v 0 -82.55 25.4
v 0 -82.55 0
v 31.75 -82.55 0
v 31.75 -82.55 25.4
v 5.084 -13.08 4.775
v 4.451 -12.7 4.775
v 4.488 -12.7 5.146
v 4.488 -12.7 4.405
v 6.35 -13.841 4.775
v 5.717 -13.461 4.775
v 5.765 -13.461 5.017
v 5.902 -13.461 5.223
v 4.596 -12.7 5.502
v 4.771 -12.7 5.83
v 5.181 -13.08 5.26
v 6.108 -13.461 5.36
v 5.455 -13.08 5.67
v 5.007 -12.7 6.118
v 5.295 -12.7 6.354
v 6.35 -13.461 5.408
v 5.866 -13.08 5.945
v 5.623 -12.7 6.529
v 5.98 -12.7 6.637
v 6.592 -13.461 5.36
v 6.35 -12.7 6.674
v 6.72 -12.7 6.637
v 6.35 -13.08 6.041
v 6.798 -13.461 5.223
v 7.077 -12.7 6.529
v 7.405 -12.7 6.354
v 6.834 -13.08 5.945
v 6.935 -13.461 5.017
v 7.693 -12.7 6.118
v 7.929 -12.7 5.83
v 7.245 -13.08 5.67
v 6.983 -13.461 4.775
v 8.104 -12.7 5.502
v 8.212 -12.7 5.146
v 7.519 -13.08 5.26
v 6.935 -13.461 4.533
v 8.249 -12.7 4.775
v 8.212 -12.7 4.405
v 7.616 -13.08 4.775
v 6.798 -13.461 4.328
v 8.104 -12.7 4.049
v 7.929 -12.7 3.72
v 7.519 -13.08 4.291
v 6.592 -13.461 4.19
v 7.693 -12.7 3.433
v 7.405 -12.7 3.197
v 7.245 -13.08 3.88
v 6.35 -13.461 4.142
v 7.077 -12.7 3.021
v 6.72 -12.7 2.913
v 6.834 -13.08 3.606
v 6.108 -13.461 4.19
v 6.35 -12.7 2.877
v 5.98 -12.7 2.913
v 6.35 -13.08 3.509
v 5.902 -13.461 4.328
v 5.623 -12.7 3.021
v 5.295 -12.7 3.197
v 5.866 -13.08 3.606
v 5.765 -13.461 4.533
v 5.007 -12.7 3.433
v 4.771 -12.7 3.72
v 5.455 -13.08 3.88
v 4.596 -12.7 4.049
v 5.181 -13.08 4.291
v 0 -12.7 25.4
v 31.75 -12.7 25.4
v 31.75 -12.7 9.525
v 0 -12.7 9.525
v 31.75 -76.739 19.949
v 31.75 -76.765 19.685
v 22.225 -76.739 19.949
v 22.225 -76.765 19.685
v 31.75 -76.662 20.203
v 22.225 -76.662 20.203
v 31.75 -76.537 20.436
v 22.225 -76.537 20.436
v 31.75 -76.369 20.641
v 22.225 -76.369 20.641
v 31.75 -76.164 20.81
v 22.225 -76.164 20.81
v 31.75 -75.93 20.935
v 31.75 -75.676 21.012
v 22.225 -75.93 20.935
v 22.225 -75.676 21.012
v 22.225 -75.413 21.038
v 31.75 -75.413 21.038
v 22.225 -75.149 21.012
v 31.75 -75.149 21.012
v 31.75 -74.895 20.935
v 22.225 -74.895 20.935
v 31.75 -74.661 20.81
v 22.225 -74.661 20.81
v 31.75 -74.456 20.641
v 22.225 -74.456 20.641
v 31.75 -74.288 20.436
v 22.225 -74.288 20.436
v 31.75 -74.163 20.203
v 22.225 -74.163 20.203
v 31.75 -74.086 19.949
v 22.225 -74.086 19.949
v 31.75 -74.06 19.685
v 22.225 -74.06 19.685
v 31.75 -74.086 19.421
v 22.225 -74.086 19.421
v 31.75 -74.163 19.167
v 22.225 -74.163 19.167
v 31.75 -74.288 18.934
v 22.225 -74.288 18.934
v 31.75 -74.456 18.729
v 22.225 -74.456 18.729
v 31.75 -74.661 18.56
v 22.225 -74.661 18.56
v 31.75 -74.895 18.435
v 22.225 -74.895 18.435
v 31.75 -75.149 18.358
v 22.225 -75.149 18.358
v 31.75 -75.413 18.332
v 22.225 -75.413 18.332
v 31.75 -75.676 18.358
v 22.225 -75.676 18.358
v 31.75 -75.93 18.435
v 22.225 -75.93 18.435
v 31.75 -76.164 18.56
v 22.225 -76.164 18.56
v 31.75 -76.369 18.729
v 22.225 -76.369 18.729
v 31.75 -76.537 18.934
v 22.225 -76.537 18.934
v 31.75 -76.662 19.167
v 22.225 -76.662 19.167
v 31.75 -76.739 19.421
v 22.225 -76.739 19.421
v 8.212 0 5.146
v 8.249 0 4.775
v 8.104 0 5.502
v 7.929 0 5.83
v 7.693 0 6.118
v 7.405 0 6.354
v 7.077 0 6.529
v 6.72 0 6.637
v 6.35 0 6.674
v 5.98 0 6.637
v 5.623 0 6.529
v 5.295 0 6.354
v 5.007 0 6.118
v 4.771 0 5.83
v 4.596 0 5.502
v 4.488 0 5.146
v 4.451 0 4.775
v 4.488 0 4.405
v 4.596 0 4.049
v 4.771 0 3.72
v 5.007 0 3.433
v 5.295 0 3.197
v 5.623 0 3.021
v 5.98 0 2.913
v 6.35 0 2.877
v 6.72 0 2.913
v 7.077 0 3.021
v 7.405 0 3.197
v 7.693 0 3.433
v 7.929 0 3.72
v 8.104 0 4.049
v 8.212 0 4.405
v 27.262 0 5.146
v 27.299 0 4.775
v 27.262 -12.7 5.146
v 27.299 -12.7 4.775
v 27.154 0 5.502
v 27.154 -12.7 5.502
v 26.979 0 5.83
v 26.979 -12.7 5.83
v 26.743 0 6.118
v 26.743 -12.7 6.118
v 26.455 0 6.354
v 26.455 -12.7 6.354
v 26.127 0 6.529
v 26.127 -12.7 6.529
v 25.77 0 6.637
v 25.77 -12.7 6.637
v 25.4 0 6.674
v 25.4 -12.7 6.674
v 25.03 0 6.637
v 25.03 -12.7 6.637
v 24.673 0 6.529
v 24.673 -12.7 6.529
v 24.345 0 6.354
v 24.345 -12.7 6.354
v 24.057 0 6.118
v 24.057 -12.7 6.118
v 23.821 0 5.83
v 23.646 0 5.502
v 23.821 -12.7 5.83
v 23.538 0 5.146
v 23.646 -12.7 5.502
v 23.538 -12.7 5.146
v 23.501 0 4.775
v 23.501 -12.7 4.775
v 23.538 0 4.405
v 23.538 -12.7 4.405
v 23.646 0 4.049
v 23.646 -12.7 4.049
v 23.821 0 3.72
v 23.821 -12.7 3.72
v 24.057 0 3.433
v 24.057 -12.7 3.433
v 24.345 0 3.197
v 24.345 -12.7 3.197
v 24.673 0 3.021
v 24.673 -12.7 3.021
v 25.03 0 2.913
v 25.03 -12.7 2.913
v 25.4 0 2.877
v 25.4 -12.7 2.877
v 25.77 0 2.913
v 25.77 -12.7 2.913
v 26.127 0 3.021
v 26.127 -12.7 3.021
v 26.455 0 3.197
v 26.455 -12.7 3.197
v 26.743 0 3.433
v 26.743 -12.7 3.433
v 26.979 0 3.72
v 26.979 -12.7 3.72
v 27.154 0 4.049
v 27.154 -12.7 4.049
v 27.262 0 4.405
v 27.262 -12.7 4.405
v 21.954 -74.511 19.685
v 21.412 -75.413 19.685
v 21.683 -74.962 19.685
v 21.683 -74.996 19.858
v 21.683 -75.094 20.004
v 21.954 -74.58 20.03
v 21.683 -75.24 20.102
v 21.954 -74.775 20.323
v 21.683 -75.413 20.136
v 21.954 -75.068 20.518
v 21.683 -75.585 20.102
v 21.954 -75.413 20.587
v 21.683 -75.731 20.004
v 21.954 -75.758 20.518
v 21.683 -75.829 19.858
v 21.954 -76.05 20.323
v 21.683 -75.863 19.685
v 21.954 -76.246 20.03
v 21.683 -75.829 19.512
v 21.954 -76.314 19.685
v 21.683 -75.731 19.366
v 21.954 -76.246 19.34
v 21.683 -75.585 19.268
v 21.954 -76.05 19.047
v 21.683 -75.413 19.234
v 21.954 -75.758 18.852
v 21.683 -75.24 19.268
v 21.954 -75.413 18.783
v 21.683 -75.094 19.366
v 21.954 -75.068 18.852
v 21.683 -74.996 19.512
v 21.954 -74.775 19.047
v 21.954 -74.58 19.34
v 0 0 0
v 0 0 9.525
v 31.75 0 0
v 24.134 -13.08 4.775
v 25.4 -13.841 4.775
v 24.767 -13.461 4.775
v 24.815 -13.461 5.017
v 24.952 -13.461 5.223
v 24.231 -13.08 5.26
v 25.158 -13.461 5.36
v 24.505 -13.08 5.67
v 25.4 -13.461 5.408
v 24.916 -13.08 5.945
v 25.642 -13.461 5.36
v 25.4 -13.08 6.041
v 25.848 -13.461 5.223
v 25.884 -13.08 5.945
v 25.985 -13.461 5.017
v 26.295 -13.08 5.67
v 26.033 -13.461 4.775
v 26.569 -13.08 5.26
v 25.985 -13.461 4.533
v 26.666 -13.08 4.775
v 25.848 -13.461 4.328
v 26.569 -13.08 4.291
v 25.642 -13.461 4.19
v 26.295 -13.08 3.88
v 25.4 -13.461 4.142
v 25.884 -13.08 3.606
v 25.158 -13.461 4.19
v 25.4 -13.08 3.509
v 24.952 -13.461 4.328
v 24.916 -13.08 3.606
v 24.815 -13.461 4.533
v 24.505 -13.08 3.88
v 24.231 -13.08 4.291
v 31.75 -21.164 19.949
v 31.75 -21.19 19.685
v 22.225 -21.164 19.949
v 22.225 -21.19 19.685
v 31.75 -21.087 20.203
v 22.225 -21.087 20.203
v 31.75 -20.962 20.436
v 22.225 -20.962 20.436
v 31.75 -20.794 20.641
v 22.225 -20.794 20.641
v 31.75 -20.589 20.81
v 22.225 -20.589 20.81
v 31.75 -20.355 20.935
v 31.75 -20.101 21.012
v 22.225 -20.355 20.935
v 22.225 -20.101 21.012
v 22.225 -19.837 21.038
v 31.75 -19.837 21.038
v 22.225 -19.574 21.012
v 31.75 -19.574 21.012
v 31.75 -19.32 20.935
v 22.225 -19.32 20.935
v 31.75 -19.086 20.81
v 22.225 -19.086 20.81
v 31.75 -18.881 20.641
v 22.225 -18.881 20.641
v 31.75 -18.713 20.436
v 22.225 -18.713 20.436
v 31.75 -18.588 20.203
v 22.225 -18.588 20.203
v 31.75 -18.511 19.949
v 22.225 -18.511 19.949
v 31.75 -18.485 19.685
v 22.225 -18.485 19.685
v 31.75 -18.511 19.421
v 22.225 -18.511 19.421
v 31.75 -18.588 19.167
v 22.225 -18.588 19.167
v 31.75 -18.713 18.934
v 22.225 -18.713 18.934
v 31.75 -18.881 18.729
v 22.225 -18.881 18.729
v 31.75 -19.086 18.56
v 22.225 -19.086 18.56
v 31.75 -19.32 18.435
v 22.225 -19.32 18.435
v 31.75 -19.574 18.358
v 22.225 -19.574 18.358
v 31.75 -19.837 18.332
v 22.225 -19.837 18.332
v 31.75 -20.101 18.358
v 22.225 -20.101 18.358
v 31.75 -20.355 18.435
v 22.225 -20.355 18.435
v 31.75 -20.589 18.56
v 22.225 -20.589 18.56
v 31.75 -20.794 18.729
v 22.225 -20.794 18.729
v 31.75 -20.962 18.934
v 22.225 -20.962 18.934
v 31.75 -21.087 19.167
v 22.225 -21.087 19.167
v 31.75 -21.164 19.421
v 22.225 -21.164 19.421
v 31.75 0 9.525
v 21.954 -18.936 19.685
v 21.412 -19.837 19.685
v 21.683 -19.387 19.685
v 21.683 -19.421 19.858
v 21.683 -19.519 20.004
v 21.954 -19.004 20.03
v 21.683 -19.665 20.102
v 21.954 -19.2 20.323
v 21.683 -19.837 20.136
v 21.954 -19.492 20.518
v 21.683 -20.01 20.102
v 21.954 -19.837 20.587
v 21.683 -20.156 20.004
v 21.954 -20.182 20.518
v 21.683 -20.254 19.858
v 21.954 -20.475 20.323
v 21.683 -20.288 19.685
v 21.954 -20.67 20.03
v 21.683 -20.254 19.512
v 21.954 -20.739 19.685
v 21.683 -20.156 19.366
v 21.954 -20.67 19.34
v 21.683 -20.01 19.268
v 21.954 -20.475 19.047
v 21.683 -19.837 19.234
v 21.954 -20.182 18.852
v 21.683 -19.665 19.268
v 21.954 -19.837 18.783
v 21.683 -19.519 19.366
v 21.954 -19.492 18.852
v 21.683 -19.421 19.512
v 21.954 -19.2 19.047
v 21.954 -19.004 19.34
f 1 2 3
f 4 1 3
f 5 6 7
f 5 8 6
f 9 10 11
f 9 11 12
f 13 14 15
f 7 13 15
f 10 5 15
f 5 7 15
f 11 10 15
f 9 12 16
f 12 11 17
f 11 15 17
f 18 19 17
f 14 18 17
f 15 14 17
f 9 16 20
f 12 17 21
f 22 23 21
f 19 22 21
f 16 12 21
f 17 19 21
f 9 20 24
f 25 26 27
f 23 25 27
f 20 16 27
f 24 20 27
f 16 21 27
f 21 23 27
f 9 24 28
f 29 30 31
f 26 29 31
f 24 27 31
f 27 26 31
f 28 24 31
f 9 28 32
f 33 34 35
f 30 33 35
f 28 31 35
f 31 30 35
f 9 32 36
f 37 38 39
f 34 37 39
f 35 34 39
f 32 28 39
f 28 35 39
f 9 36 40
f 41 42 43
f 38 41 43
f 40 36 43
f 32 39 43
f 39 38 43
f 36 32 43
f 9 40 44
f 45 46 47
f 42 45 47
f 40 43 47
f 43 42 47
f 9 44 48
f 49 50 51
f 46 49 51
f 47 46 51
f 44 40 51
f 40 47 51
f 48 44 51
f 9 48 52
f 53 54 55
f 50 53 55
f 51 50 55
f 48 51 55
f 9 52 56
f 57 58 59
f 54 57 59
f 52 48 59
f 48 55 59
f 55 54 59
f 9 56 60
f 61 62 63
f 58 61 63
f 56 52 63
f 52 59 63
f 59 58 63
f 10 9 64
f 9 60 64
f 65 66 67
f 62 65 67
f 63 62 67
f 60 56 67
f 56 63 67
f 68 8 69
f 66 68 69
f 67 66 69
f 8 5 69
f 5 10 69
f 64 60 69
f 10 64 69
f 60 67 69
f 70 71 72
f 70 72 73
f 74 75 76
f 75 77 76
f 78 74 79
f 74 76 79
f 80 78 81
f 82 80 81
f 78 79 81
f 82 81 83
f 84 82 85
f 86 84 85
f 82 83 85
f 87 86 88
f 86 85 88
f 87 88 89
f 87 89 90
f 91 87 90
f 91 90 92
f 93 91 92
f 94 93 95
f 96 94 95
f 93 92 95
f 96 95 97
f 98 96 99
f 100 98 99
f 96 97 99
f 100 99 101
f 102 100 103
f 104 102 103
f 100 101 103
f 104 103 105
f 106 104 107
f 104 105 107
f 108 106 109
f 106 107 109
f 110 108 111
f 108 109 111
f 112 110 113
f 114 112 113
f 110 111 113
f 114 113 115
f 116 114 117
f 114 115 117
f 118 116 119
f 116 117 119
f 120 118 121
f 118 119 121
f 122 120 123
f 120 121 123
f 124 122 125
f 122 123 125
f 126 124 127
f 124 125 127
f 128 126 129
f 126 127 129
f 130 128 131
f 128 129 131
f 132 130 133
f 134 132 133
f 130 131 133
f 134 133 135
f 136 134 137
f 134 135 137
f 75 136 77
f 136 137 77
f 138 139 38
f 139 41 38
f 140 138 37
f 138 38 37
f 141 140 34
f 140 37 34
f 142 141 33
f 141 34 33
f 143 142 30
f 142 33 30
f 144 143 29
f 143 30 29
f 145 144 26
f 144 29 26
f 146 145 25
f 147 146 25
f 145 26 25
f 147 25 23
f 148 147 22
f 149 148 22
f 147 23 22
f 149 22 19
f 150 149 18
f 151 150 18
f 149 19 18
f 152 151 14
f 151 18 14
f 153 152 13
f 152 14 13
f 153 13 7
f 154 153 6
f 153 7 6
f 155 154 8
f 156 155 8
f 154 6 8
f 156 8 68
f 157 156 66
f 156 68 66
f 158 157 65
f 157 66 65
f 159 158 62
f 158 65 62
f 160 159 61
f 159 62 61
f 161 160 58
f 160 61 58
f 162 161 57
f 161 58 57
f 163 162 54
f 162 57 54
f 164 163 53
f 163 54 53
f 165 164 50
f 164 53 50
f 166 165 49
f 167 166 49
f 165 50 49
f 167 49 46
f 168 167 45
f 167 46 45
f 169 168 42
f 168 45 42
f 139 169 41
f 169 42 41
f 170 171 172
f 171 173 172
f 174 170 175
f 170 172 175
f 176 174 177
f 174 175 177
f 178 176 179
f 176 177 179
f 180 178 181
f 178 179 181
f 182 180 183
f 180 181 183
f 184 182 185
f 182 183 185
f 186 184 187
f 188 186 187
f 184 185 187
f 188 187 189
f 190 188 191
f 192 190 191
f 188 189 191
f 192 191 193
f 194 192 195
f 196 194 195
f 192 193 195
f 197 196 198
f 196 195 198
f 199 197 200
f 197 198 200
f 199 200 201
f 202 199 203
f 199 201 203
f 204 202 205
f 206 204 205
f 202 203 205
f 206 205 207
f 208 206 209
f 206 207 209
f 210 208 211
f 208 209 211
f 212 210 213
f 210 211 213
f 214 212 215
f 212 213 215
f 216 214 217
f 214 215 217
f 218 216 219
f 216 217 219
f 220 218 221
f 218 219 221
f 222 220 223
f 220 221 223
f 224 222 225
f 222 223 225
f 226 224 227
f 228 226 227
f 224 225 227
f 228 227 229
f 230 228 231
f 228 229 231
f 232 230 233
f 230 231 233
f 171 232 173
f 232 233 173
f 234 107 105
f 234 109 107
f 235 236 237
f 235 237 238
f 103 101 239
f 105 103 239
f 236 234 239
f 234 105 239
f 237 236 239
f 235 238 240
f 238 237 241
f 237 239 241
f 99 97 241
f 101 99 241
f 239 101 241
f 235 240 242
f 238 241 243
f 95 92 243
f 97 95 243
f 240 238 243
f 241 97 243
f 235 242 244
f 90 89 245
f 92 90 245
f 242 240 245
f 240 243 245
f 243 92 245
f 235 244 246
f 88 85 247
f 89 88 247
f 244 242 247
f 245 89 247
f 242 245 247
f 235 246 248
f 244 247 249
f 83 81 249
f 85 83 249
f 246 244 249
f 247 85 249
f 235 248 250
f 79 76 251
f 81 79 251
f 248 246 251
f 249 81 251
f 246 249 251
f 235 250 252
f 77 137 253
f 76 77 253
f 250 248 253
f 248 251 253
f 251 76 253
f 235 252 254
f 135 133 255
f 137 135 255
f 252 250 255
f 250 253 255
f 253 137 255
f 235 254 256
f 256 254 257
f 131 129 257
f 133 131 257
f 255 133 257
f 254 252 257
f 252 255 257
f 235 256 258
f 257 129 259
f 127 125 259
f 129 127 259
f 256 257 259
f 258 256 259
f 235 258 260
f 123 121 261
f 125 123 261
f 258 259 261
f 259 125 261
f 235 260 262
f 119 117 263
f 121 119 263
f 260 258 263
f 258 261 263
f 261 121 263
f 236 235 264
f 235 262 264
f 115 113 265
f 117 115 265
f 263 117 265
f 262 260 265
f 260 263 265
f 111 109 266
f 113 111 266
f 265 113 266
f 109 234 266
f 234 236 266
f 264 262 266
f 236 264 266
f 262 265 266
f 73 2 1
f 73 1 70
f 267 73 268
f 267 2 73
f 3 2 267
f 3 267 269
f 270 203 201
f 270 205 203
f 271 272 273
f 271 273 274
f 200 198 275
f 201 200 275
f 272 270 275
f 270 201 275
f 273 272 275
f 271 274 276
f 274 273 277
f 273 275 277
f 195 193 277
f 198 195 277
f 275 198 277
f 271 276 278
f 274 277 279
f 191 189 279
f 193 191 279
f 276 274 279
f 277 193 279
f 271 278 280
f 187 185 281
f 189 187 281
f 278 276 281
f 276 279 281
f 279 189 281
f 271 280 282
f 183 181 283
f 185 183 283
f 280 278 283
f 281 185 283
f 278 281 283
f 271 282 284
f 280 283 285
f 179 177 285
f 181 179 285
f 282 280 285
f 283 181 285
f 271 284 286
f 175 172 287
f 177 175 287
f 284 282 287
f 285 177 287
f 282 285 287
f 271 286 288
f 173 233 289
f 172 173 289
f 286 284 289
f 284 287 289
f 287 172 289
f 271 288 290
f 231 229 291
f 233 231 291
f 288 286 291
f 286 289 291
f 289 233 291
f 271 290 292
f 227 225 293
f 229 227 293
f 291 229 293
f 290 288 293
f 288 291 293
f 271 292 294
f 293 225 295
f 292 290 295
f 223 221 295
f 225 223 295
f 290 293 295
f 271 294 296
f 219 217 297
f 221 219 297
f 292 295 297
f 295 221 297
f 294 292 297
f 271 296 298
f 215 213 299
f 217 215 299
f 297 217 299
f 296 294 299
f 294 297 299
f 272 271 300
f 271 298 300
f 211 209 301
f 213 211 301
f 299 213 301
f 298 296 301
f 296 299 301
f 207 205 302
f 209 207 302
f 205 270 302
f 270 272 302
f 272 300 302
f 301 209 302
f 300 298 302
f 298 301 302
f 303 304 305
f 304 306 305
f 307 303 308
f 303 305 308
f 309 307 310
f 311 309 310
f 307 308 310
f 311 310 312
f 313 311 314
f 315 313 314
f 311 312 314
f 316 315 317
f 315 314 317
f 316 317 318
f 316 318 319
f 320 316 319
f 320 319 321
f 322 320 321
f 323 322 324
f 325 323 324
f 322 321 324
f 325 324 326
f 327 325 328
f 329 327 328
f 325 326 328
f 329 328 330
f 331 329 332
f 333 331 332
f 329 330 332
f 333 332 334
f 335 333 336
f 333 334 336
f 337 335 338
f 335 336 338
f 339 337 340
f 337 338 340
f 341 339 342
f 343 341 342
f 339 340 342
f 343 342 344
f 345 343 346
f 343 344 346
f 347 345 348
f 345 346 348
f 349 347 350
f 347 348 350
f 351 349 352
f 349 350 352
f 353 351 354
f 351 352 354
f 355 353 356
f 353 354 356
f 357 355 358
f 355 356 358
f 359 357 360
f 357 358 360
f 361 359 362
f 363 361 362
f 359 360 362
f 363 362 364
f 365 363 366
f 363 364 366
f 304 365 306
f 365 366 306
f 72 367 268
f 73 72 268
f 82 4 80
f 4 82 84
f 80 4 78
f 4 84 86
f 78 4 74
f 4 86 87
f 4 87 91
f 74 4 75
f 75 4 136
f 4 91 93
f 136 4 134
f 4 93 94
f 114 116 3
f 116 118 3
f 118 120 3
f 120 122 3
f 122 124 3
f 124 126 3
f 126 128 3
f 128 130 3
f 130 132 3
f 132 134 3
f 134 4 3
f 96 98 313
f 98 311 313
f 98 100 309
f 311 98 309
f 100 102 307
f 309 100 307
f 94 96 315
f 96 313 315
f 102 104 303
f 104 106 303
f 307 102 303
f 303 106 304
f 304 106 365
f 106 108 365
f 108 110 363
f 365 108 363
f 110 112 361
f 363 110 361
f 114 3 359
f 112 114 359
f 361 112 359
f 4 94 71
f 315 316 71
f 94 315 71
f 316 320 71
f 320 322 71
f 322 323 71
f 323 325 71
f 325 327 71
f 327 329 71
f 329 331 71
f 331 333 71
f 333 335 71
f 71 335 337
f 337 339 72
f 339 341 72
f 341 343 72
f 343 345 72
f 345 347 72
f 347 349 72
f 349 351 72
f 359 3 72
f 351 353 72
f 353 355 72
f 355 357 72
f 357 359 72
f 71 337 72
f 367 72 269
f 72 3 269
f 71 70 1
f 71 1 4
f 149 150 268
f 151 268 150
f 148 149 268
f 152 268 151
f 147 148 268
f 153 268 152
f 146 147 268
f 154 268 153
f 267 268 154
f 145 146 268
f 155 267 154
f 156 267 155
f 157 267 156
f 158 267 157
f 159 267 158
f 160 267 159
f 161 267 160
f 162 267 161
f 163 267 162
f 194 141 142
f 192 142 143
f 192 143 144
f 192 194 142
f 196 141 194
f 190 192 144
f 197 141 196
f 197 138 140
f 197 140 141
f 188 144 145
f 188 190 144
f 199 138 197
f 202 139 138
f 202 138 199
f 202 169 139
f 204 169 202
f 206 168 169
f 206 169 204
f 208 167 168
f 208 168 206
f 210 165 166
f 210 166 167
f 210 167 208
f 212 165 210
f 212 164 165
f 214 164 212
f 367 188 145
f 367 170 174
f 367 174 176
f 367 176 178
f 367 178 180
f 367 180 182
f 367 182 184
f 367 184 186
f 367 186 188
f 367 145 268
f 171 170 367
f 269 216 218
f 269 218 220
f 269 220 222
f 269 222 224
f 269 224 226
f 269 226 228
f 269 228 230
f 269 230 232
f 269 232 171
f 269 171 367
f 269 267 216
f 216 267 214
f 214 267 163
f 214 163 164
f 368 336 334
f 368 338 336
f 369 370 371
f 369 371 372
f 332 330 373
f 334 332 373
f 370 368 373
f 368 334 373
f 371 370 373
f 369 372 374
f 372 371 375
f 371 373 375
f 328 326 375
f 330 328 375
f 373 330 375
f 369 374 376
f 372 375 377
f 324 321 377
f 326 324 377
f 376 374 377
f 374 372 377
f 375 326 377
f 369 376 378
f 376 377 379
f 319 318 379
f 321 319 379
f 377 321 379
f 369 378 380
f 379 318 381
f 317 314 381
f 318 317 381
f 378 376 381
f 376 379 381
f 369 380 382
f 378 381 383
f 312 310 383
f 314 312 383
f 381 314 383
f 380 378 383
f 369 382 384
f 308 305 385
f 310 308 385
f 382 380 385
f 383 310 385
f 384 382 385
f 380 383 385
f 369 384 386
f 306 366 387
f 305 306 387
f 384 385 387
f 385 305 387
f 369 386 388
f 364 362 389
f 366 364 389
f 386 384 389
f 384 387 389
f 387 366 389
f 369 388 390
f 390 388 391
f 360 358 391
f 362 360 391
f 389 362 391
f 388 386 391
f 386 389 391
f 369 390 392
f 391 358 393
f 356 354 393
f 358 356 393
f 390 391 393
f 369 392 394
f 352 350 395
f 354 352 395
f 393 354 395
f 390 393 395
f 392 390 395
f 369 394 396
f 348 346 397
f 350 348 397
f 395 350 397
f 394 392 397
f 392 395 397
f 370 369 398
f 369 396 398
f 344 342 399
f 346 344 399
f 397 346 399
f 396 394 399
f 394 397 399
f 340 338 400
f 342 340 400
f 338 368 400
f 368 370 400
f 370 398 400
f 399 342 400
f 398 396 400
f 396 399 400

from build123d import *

# Parameters (mm, degrees)
F0_W     = 31.75
F0_H     = 82.55
F1_DEPTH = 25.4
F2_W     = 31.75
F2_H     = 15.875
F3_DEPTH = 12.7
F5_D     = 3.7973
F5_DEPTH = 12.7
F5_TIP   = 1.1408240143
F7_D     = 2.7051
F7_DEPTH = 9.525
F7_TIP   = 0.8126940303


with BuildPart() as f1:
    # F0 (on Top) → F1 (new body)
    with BuildSketch(Plane.XY):
        with Locations((15.875, -41.275)):
            Rectangle(F0_W, F0_H)
    extrude(amount=F1_DEPTH)

    # F2 (on face) → F3 (cut)
    with BuildSketch(Plane(origin=(0, 0, 0), x_dir=(-1, 0, 0), z_dir=(0, 1, 0))):
        with Locations((-15.875, 17.4625)):
            Rectangle(F2_W, F2_H)
    extrude(amount=-F3_DEPTH, mode=Mode.SUBTRACT)

    # F5
    with Locations(Plane(origin=(0, 0, 0), x_dir=(-1, 0, 0), z_dir=(0, 1, 0))):
        with Locations((-25.4, 4.7752), (-6.35, 4.7752)):
            Hole(F5_D / 2, depth=F5_DEPTH)
            with Locations((0, 0, -(F5_DEPTH + F5_TIP / 2))):  # 118° drill point
                Cone(0, F5_D / 2, F5_TIP, mode=Mode.SUBTRACT)

    # F7
    with Locations(Plane.YZ.offset(31.75)):
        with Locations((-19.8374, 19.685), (-75.4126, 19.685)):
            Hole(F7_D / 2, depth=F7_DEPTH)
            with Locations((0, 0, -(F7_DEPTH + F7_TIP / 2))):  # 118° drill point
                Cone(0, F7_D / 2, F7_TIP, mode=Mode.SUBTRACT)


solid = f1.part
